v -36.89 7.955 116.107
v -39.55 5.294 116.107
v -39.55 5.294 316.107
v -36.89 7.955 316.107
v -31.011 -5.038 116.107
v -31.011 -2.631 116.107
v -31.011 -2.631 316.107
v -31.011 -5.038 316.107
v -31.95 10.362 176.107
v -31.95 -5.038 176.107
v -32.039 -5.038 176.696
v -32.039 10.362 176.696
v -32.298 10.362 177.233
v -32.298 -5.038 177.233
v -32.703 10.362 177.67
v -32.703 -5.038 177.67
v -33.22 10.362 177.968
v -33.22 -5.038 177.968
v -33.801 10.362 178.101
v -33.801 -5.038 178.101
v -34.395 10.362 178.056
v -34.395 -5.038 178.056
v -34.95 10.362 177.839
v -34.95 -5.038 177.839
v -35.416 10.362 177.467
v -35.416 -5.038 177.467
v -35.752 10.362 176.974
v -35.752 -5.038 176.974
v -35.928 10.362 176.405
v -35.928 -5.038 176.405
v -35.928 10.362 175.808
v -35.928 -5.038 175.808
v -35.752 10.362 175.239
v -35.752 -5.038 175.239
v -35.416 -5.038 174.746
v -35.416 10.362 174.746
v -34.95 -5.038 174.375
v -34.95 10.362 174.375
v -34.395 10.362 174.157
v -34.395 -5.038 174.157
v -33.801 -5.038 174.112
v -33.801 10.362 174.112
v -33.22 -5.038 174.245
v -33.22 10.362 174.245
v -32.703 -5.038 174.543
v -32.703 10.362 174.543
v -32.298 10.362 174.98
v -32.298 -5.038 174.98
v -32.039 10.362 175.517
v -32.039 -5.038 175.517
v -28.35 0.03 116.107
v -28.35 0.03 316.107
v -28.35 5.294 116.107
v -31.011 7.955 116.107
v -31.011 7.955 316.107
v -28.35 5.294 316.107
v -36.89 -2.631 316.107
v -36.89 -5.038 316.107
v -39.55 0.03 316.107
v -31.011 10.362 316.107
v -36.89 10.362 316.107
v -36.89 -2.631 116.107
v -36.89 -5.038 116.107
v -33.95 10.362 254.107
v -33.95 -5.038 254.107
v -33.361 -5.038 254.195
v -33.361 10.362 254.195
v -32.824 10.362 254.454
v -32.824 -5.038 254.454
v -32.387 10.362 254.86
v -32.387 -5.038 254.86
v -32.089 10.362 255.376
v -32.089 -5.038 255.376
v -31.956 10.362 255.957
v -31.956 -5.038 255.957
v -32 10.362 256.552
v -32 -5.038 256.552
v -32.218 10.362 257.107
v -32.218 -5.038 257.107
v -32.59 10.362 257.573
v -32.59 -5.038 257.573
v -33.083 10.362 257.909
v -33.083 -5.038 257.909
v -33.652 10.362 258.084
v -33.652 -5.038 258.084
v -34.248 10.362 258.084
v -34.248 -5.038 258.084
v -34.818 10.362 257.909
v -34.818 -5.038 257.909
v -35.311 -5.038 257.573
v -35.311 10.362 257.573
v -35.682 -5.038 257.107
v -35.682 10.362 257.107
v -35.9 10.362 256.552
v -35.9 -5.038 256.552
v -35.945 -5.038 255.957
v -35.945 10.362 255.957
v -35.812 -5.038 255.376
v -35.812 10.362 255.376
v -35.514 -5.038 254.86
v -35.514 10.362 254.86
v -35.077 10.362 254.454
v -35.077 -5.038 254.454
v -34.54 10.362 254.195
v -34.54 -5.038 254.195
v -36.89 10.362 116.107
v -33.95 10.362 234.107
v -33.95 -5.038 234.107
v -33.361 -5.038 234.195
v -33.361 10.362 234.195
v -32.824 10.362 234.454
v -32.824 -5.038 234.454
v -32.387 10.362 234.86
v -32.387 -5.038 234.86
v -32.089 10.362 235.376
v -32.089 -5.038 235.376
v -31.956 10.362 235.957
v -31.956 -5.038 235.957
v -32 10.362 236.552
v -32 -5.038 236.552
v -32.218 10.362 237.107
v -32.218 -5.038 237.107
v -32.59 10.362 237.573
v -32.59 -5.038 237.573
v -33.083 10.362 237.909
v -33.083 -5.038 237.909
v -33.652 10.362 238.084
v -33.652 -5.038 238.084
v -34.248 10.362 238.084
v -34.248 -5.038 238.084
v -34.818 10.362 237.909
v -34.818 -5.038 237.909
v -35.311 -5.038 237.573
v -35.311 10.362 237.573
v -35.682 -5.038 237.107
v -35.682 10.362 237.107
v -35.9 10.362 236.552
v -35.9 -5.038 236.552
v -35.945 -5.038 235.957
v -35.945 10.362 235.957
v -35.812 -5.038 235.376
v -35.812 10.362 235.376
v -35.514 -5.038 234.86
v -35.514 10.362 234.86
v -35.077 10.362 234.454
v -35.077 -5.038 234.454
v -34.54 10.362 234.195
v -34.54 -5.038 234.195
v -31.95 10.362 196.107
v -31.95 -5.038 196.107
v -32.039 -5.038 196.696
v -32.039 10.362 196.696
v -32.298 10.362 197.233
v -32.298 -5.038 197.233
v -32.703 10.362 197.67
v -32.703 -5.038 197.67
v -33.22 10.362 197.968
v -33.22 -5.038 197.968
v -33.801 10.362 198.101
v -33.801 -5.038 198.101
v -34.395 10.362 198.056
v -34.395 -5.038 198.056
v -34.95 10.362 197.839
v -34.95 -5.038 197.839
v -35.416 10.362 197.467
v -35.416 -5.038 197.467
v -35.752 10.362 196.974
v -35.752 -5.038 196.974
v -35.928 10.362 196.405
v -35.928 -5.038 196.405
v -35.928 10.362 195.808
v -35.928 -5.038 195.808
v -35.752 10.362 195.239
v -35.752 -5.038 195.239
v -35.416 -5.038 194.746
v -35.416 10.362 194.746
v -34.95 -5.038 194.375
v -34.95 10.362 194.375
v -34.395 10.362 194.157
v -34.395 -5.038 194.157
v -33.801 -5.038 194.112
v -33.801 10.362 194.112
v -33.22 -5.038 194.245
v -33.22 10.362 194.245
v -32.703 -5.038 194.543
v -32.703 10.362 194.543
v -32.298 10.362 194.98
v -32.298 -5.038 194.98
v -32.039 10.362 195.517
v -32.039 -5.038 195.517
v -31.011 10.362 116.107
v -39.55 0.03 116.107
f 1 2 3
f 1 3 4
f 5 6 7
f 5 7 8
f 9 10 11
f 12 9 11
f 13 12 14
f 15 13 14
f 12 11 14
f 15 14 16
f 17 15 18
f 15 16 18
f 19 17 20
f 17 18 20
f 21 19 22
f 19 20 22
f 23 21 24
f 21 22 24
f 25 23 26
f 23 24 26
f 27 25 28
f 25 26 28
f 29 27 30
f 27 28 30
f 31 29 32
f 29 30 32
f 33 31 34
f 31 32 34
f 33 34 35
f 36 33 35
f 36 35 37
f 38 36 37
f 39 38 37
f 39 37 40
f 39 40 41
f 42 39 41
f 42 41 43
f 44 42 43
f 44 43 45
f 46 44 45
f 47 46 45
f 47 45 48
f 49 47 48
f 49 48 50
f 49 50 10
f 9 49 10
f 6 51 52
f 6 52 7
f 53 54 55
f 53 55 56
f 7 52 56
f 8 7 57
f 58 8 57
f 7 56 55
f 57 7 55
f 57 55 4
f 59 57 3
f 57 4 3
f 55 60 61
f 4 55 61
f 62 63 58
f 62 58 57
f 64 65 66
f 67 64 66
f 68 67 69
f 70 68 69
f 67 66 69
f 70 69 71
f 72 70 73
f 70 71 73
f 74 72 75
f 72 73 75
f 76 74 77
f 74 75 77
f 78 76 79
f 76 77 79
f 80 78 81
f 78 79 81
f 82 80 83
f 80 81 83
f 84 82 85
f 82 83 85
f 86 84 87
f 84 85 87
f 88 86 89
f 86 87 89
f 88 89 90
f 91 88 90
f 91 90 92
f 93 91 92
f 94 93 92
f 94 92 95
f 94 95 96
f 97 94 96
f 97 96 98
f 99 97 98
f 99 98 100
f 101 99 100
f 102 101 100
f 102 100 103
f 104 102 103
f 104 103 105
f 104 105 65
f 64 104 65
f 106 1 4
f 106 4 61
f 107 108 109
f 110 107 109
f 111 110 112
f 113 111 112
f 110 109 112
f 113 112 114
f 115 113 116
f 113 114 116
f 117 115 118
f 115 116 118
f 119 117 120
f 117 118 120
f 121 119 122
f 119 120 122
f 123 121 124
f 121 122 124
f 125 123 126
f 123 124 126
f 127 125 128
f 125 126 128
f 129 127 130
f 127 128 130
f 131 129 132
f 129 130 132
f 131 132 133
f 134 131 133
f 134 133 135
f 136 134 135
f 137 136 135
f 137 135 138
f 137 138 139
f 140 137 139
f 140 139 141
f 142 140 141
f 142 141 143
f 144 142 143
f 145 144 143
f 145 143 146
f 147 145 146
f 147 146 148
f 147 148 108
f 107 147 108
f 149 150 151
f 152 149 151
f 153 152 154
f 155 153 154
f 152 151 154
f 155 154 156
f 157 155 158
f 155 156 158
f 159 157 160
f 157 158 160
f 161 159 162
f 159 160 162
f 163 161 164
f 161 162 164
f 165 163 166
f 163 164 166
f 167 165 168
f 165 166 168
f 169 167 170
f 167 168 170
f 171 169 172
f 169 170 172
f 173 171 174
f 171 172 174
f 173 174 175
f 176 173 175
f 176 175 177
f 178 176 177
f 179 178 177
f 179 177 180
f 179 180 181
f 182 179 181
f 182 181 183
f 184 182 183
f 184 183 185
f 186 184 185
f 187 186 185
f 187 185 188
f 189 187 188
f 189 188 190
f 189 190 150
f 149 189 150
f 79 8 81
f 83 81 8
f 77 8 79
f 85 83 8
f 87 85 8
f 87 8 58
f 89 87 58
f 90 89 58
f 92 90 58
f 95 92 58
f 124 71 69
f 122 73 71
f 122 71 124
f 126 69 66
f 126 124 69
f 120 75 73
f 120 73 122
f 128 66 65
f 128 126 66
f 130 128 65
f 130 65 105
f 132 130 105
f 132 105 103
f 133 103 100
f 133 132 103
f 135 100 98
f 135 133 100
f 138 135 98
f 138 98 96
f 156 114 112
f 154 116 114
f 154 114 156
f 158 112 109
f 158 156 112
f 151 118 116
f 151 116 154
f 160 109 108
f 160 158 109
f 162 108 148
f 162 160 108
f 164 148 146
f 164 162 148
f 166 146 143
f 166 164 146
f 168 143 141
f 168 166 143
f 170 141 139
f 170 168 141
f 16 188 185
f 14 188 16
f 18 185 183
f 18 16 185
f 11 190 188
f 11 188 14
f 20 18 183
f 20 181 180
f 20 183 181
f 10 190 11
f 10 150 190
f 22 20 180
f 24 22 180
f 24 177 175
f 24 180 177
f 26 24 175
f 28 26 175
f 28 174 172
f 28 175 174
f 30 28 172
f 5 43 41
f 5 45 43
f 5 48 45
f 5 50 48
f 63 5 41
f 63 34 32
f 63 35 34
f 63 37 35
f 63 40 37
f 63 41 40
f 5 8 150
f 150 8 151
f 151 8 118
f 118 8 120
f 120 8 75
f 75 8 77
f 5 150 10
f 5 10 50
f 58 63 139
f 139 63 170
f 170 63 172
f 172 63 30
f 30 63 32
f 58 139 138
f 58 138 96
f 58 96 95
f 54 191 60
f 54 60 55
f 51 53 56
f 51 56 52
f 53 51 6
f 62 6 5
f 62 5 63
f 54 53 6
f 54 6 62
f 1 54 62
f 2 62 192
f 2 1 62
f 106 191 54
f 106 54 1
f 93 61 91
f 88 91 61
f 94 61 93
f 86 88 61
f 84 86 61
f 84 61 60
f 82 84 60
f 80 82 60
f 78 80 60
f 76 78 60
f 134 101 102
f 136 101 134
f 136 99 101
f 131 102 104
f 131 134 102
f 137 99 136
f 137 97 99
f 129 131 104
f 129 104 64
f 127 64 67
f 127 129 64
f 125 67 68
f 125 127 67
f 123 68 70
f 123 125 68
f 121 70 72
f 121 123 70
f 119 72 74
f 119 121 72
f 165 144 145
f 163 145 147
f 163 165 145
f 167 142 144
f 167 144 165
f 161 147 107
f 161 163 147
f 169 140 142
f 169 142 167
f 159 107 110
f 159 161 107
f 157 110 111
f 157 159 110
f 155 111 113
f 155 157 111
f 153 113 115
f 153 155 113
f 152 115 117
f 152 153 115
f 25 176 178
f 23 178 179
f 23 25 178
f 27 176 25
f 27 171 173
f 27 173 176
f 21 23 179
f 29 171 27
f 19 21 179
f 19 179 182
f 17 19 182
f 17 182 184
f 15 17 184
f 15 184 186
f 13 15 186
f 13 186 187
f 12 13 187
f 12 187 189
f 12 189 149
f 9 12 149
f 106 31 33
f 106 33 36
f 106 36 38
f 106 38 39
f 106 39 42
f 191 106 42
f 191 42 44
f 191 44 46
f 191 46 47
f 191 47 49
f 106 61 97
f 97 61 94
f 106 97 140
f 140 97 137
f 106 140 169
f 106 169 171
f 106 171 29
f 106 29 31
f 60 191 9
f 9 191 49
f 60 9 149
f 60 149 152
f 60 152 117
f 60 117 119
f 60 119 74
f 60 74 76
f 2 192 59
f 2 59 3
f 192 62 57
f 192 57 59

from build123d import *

# Parameters (mm, degrees)
BOSS_EXTRUDE1_DEPTH = 200
SKETCH4_R           = 2
CUT_EXTRUDE1_DEPTH  = 40


with BuildPart() as part:
    # Sketch1 → Boss-Extrude1 (new body)
    with BuildSketch(Plane.XY.offset(116.106580091)):
        Polygon((-39.550290087, 5.294235639), (-36.889629915, 7.954895811), (-36.889629915, 10.362002592), (-31.010950259, 10.362002592), (-31.010950259, 7.954895811), (-28.350290087, 5.294235639), (-28.350290087, 0.029769545), (-31.010950259, -2.630890626), (-31.010950259, -5.037997408), (-36.889629915, -5.037997408), (-36.889629915, -2.630890626), (-39.550290087, 0.029769545), align=None)
    extrude(amount=BOSS_EXTRUDE1_DEPTH)

    # Sketch4 → Cut-Extrude1 (cut)
    with BuildSketch(Plane(origin=(0, -5.037997408, 0), x_dir=(-1, 0, 0), z_dir=(0, -1, 0))):
        with Locations(Location((33.950290087, -176.106580091, 0), (0, 0, 180))):
            Circle(SKETCH4_R)
        with Locations(Location((33.950290087, -196.106580091, 0), (0, 0, 180))):
            Circle(SKETCH4_R)
        with Locations(Location((33.950290087, -236.106580091, 0), (0, 0, 90))):
            Circle(SKETCH4_R)
        with Locations(Location((33.950290087, -256.106580091, 0), (0, 0, 90))):
            Circle(SKETCH4_R)
    extrude(amount=-CUT_EXTRUDE1_DEPTH, mode=Mode.SUBTRACT)


solid = part.part
